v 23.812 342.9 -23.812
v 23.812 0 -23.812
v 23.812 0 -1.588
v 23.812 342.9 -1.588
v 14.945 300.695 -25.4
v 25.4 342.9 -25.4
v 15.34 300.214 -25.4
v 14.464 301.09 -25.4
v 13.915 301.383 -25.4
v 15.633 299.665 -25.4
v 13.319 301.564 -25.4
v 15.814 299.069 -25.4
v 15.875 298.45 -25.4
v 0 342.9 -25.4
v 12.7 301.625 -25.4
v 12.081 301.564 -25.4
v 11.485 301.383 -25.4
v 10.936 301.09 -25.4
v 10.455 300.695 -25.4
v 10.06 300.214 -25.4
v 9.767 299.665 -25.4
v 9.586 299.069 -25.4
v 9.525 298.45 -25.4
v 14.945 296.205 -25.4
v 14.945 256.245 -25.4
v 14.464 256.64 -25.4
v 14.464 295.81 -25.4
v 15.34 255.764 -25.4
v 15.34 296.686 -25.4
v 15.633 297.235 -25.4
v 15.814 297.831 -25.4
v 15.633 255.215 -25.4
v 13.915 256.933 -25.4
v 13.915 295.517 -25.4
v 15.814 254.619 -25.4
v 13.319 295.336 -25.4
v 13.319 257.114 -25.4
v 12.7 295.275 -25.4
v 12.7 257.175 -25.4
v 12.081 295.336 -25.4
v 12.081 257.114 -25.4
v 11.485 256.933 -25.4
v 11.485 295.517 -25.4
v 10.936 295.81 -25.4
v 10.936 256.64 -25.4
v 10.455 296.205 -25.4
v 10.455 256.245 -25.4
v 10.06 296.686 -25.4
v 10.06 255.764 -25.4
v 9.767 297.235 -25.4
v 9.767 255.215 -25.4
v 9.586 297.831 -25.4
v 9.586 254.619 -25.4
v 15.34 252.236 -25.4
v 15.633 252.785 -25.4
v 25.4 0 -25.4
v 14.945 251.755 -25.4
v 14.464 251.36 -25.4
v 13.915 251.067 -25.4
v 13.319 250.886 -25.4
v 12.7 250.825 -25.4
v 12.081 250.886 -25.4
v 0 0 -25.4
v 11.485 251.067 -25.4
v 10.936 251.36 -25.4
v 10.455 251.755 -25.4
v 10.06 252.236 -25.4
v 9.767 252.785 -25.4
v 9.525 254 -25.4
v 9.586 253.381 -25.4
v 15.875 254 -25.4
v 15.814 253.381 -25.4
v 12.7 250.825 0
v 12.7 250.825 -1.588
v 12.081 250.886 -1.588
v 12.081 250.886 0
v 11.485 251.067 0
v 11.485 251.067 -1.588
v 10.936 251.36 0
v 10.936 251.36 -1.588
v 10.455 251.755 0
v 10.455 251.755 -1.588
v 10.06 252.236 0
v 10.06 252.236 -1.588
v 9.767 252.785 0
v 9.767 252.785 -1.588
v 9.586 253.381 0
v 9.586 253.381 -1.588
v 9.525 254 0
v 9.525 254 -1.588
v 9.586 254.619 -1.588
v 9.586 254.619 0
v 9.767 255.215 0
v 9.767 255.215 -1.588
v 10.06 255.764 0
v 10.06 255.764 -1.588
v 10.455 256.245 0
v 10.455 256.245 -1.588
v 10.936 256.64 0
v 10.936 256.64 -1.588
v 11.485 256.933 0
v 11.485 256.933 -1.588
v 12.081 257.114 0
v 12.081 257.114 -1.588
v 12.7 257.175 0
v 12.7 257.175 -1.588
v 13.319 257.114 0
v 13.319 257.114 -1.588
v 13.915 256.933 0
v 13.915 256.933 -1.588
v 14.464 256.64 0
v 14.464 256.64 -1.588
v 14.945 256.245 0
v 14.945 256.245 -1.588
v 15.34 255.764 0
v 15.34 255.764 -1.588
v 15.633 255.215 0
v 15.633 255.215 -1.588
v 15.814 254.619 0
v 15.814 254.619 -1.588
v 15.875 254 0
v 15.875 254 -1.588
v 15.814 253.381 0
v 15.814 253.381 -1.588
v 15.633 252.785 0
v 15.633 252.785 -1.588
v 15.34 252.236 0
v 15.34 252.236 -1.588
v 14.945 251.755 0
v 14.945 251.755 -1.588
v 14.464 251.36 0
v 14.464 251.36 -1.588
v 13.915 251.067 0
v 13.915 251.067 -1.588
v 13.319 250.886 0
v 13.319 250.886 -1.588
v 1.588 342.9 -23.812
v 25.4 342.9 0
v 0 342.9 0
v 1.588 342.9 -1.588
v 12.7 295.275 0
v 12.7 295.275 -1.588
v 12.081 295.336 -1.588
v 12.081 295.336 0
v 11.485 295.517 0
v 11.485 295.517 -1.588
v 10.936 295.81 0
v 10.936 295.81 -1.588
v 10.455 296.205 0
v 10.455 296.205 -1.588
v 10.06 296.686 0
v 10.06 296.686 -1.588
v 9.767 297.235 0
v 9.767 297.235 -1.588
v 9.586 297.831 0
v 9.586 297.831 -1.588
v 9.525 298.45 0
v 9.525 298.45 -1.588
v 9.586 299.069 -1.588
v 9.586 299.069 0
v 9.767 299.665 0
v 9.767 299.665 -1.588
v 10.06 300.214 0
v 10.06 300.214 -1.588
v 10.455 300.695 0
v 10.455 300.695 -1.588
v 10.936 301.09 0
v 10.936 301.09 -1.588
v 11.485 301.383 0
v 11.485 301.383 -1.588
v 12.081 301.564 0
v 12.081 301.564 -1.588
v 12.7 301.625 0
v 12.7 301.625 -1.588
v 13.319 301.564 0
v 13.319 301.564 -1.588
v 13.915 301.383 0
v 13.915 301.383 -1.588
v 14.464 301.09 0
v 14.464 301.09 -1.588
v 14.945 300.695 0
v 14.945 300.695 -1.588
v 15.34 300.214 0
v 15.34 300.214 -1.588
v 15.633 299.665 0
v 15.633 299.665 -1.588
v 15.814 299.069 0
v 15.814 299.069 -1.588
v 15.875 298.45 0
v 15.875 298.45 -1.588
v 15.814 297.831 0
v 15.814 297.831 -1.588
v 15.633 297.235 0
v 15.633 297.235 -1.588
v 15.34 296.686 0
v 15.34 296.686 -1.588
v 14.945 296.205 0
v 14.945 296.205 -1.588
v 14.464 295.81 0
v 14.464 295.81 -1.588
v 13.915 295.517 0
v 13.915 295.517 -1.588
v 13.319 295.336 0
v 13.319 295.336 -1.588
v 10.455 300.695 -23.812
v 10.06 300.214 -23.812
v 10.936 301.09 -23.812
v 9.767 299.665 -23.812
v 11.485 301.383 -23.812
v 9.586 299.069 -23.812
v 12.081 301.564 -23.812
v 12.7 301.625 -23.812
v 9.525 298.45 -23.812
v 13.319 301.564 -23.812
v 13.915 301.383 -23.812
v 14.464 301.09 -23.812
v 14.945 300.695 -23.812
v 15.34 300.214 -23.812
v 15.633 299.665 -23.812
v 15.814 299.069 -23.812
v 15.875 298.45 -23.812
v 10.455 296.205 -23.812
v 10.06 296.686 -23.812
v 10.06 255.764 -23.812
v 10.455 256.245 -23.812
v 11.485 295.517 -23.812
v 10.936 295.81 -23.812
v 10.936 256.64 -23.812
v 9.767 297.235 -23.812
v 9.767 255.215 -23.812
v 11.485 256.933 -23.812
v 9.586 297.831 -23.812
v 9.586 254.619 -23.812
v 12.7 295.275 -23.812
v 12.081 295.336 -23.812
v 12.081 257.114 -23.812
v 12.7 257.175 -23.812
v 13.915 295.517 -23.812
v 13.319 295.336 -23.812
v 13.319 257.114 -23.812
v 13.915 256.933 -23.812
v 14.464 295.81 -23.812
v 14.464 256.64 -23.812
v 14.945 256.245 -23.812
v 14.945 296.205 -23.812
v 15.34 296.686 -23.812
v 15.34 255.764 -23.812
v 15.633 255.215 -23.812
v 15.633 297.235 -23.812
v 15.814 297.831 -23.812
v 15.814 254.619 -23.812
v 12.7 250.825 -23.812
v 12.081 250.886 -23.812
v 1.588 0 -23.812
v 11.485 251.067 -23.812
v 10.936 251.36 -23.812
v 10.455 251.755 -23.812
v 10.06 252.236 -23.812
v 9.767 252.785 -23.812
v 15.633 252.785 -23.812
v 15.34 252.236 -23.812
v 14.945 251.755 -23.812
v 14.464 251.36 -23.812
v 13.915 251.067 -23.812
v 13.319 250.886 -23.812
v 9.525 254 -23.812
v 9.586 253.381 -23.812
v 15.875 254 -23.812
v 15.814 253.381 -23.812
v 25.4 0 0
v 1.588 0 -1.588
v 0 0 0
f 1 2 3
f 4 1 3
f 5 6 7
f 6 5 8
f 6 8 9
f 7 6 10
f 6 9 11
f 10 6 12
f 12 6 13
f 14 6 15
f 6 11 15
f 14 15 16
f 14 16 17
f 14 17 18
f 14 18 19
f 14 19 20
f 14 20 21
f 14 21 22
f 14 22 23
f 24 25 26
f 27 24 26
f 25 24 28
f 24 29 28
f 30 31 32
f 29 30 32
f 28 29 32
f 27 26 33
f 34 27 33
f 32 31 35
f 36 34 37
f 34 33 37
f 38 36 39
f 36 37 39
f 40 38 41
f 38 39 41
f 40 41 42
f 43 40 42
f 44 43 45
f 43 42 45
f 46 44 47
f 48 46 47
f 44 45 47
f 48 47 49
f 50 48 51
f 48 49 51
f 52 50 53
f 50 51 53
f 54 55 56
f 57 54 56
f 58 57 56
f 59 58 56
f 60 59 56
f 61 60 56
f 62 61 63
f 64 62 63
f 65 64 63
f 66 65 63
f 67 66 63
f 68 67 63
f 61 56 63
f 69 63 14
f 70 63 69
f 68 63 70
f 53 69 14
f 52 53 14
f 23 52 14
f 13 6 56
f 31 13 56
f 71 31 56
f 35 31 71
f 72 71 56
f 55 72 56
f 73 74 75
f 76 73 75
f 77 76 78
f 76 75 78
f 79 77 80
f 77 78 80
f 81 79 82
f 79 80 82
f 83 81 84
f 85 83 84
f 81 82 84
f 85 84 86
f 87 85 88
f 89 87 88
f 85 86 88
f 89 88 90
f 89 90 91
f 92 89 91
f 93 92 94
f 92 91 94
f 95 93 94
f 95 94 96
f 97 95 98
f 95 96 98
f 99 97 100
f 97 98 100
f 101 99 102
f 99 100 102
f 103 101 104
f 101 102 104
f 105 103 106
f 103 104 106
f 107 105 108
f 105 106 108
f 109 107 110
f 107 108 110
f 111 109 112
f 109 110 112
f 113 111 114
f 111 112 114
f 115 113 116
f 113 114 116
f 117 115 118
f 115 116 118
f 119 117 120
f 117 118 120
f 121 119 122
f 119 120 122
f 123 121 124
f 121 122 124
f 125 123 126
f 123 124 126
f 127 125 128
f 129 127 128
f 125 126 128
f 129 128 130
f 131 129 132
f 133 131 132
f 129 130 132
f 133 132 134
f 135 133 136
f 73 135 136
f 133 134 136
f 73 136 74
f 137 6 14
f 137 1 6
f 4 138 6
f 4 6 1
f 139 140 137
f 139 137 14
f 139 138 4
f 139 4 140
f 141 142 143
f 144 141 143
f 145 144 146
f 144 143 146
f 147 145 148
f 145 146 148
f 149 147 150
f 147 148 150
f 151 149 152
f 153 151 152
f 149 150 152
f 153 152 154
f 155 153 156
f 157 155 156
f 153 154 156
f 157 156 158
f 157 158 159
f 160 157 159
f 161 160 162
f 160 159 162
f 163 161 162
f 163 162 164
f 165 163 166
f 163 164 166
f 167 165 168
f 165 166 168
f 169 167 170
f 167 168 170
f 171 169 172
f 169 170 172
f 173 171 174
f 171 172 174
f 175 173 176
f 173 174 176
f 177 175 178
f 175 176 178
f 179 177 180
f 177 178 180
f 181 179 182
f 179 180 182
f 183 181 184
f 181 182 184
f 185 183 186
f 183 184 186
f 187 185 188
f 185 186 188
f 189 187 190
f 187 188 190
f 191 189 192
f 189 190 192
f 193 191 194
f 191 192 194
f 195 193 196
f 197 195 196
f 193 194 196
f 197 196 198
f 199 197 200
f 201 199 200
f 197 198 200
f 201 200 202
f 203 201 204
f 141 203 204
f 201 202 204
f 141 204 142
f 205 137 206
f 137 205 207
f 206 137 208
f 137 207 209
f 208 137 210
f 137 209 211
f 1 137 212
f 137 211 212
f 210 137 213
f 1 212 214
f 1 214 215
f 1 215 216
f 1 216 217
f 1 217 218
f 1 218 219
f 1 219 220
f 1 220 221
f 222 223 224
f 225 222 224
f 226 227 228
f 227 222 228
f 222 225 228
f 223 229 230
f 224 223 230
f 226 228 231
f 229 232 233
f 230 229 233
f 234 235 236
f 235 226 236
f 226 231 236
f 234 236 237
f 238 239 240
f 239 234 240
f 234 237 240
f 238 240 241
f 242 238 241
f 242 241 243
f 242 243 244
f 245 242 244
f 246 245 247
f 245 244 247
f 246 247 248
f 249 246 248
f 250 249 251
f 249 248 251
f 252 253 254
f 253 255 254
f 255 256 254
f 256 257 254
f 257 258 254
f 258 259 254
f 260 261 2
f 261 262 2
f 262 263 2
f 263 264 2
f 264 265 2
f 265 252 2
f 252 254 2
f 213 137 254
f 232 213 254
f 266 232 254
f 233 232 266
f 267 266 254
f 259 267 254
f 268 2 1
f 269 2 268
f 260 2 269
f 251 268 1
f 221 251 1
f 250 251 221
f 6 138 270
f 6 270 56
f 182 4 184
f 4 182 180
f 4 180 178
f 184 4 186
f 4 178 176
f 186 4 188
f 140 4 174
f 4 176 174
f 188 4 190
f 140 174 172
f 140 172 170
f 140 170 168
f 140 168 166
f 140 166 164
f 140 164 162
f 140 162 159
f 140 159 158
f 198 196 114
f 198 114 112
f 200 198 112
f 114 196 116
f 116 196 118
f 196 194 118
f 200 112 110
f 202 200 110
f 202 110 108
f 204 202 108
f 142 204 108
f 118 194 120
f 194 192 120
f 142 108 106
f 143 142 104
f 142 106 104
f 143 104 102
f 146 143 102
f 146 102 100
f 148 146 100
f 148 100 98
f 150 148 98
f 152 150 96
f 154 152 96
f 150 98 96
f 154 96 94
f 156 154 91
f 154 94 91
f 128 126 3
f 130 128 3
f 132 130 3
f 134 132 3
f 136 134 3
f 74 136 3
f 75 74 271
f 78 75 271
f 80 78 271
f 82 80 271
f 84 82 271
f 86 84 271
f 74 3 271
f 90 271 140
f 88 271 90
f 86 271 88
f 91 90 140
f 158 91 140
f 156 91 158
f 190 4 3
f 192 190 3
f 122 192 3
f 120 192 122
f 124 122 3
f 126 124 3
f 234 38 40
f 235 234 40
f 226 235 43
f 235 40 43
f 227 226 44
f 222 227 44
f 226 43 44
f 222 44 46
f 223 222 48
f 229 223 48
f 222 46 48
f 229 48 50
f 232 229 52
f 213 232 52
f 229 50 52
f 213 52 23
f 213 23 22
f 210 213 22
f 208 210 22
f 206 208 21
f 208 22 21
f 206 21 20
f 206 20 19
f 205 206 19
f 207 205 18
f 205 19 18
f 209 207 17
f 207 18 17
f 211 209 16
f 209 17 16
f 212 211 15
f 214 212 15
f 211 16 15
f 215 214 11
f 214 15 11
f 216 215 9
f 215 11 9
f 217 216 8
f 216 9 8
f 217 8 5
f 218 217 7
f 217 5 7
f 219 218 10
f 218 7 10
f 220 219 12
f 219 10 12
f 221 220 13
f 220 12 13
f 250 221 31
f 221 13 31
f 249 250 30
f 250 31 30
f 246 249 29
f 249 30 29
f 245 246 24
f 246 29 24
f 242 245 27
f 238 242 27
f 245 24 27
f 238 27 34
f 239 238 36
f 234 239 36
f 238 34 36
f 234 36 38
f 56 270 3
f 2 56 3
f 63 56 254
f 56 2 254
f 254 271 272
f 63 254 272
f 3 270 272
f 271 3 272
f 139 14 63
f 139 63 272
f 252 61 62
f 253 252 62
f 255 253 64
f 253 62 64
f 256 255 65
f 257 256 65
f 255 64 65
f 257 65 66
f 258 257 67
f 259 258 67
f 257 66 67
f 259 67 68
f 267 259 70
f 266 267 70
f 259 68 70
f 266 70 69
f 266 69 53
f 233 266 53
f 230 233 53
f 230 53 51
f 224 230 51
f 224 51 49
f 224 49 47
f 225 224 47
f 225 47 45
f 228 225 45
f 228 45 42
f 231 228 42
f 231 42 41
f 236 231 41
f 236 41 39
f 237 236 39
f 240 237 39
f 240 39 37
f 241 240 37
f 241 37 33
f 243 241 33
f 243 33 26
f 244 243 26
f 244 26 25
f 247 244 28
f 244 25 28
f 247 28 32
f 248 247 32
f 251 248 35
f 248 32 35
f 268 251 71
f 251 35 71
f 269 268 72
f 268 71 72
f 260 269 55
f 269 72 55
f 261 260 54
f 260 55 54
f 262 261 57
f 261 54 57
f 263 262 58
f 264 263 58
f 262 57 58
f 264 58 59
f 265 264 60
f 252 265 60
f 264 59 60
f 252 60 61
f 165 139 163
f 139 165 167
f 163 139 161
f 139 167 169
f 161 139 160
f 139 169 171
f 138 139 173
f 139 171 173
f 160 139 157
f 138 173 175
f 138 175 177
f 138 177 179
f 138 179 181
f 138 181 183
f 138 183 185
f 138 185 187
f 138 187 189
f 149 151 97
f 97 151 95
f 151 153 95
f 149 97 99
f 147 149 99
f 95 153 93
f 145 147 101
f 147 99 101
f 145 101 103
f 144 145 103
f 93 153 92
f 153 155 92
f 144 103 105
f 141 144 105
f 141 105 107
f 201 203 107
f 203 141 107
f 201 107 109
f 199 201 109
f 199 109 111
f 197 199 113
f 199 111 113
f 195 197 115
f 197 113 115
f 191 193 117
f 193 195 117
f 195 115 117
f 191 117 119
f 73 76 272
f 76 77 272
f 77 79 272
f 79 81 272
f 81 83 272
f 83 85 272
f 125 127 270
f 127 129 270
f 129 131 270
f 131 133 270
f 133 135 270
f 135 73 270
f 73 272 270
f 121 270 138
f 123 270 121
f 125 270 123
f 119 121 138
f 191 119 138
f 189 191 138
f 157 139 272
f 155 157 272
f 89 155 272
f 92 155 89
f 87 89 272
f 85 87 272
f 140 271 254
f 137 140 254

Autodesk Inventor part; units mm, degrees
ref_plane "YZ Plane" through (0, 0, 0) normal (1, 0, 0) x (0, 1, 0)
ref_plane "XZ Plane" through (0, 0, 0) normal (0, 1, 0) x (-1, 0, 0)
ref_plane "XY Plane" through (0, 0, 0) normal (0, 0, 1) x (1, 0, 0)
sketch "Sketch1" plane through (0, 0, 0) normal (0, 1, 0) x (-1, 0, 0)
  line L0 (0, 0) -> (-25.4, 0)
  line L1 (-25.4, 0) -> (-25.4, -25.4)
  line L2 (-25.4, -25.4) -> (0, -25.4)
  line L3 (0, -25.4) -> (0, 0)
  line L4 (-1.5875, -23.8125) -> (-23.8125, -23.8125)
  line L5 (-23.8125, -23.8125) -> (-23.8125, -1.5875)
  line L6 (-23.8125, -1.5875) -> (-1.5875, -1.5875)
  line L7 (-1.5875, -1.5875) -> (-1.5875, -23.8125)
  dimension "d0" = 25.4
  dimension "d1" = 25.4
  dimension "d2" = 1.5875
extrude "Extrusion1" add sketch "Sketch1" along normal blind 342.9
sketch "Sketch2" plane through (0, 0, 0) normal (0, 0, 1) x (1, 0, 0)
  line L0 (0, 342.9) -> (25.4, 342.9) projected
  line L1 (0, 0) -> (0, 342.9) projected
  point P0 (12.7, 298.45)
  dimension "d5" = 44.45
  dimension "d6" = 12.7
hole "Hole1" at (12.7, 298.45, 0) direction (0, 0, -1) diameter 6.35 end through all
sketch "Sketch3" plane through (0, 0, 0) normal (0, 0, 1) x (1, 0, 0)
  line L0 (0, 342.9) -> (25.4, 342.9) projected
  line L1 (0, 0) -> (0, 342.9) projected
  point P0 (12.7, 254)
  dimension "d14" = 88.9
  dimension "d15" = 12.7
hole "Hole2" at (12.7, 254, 0) direction (0, 0, -1) diameter 6.35 end through all
properties part number "gripper main arm"
